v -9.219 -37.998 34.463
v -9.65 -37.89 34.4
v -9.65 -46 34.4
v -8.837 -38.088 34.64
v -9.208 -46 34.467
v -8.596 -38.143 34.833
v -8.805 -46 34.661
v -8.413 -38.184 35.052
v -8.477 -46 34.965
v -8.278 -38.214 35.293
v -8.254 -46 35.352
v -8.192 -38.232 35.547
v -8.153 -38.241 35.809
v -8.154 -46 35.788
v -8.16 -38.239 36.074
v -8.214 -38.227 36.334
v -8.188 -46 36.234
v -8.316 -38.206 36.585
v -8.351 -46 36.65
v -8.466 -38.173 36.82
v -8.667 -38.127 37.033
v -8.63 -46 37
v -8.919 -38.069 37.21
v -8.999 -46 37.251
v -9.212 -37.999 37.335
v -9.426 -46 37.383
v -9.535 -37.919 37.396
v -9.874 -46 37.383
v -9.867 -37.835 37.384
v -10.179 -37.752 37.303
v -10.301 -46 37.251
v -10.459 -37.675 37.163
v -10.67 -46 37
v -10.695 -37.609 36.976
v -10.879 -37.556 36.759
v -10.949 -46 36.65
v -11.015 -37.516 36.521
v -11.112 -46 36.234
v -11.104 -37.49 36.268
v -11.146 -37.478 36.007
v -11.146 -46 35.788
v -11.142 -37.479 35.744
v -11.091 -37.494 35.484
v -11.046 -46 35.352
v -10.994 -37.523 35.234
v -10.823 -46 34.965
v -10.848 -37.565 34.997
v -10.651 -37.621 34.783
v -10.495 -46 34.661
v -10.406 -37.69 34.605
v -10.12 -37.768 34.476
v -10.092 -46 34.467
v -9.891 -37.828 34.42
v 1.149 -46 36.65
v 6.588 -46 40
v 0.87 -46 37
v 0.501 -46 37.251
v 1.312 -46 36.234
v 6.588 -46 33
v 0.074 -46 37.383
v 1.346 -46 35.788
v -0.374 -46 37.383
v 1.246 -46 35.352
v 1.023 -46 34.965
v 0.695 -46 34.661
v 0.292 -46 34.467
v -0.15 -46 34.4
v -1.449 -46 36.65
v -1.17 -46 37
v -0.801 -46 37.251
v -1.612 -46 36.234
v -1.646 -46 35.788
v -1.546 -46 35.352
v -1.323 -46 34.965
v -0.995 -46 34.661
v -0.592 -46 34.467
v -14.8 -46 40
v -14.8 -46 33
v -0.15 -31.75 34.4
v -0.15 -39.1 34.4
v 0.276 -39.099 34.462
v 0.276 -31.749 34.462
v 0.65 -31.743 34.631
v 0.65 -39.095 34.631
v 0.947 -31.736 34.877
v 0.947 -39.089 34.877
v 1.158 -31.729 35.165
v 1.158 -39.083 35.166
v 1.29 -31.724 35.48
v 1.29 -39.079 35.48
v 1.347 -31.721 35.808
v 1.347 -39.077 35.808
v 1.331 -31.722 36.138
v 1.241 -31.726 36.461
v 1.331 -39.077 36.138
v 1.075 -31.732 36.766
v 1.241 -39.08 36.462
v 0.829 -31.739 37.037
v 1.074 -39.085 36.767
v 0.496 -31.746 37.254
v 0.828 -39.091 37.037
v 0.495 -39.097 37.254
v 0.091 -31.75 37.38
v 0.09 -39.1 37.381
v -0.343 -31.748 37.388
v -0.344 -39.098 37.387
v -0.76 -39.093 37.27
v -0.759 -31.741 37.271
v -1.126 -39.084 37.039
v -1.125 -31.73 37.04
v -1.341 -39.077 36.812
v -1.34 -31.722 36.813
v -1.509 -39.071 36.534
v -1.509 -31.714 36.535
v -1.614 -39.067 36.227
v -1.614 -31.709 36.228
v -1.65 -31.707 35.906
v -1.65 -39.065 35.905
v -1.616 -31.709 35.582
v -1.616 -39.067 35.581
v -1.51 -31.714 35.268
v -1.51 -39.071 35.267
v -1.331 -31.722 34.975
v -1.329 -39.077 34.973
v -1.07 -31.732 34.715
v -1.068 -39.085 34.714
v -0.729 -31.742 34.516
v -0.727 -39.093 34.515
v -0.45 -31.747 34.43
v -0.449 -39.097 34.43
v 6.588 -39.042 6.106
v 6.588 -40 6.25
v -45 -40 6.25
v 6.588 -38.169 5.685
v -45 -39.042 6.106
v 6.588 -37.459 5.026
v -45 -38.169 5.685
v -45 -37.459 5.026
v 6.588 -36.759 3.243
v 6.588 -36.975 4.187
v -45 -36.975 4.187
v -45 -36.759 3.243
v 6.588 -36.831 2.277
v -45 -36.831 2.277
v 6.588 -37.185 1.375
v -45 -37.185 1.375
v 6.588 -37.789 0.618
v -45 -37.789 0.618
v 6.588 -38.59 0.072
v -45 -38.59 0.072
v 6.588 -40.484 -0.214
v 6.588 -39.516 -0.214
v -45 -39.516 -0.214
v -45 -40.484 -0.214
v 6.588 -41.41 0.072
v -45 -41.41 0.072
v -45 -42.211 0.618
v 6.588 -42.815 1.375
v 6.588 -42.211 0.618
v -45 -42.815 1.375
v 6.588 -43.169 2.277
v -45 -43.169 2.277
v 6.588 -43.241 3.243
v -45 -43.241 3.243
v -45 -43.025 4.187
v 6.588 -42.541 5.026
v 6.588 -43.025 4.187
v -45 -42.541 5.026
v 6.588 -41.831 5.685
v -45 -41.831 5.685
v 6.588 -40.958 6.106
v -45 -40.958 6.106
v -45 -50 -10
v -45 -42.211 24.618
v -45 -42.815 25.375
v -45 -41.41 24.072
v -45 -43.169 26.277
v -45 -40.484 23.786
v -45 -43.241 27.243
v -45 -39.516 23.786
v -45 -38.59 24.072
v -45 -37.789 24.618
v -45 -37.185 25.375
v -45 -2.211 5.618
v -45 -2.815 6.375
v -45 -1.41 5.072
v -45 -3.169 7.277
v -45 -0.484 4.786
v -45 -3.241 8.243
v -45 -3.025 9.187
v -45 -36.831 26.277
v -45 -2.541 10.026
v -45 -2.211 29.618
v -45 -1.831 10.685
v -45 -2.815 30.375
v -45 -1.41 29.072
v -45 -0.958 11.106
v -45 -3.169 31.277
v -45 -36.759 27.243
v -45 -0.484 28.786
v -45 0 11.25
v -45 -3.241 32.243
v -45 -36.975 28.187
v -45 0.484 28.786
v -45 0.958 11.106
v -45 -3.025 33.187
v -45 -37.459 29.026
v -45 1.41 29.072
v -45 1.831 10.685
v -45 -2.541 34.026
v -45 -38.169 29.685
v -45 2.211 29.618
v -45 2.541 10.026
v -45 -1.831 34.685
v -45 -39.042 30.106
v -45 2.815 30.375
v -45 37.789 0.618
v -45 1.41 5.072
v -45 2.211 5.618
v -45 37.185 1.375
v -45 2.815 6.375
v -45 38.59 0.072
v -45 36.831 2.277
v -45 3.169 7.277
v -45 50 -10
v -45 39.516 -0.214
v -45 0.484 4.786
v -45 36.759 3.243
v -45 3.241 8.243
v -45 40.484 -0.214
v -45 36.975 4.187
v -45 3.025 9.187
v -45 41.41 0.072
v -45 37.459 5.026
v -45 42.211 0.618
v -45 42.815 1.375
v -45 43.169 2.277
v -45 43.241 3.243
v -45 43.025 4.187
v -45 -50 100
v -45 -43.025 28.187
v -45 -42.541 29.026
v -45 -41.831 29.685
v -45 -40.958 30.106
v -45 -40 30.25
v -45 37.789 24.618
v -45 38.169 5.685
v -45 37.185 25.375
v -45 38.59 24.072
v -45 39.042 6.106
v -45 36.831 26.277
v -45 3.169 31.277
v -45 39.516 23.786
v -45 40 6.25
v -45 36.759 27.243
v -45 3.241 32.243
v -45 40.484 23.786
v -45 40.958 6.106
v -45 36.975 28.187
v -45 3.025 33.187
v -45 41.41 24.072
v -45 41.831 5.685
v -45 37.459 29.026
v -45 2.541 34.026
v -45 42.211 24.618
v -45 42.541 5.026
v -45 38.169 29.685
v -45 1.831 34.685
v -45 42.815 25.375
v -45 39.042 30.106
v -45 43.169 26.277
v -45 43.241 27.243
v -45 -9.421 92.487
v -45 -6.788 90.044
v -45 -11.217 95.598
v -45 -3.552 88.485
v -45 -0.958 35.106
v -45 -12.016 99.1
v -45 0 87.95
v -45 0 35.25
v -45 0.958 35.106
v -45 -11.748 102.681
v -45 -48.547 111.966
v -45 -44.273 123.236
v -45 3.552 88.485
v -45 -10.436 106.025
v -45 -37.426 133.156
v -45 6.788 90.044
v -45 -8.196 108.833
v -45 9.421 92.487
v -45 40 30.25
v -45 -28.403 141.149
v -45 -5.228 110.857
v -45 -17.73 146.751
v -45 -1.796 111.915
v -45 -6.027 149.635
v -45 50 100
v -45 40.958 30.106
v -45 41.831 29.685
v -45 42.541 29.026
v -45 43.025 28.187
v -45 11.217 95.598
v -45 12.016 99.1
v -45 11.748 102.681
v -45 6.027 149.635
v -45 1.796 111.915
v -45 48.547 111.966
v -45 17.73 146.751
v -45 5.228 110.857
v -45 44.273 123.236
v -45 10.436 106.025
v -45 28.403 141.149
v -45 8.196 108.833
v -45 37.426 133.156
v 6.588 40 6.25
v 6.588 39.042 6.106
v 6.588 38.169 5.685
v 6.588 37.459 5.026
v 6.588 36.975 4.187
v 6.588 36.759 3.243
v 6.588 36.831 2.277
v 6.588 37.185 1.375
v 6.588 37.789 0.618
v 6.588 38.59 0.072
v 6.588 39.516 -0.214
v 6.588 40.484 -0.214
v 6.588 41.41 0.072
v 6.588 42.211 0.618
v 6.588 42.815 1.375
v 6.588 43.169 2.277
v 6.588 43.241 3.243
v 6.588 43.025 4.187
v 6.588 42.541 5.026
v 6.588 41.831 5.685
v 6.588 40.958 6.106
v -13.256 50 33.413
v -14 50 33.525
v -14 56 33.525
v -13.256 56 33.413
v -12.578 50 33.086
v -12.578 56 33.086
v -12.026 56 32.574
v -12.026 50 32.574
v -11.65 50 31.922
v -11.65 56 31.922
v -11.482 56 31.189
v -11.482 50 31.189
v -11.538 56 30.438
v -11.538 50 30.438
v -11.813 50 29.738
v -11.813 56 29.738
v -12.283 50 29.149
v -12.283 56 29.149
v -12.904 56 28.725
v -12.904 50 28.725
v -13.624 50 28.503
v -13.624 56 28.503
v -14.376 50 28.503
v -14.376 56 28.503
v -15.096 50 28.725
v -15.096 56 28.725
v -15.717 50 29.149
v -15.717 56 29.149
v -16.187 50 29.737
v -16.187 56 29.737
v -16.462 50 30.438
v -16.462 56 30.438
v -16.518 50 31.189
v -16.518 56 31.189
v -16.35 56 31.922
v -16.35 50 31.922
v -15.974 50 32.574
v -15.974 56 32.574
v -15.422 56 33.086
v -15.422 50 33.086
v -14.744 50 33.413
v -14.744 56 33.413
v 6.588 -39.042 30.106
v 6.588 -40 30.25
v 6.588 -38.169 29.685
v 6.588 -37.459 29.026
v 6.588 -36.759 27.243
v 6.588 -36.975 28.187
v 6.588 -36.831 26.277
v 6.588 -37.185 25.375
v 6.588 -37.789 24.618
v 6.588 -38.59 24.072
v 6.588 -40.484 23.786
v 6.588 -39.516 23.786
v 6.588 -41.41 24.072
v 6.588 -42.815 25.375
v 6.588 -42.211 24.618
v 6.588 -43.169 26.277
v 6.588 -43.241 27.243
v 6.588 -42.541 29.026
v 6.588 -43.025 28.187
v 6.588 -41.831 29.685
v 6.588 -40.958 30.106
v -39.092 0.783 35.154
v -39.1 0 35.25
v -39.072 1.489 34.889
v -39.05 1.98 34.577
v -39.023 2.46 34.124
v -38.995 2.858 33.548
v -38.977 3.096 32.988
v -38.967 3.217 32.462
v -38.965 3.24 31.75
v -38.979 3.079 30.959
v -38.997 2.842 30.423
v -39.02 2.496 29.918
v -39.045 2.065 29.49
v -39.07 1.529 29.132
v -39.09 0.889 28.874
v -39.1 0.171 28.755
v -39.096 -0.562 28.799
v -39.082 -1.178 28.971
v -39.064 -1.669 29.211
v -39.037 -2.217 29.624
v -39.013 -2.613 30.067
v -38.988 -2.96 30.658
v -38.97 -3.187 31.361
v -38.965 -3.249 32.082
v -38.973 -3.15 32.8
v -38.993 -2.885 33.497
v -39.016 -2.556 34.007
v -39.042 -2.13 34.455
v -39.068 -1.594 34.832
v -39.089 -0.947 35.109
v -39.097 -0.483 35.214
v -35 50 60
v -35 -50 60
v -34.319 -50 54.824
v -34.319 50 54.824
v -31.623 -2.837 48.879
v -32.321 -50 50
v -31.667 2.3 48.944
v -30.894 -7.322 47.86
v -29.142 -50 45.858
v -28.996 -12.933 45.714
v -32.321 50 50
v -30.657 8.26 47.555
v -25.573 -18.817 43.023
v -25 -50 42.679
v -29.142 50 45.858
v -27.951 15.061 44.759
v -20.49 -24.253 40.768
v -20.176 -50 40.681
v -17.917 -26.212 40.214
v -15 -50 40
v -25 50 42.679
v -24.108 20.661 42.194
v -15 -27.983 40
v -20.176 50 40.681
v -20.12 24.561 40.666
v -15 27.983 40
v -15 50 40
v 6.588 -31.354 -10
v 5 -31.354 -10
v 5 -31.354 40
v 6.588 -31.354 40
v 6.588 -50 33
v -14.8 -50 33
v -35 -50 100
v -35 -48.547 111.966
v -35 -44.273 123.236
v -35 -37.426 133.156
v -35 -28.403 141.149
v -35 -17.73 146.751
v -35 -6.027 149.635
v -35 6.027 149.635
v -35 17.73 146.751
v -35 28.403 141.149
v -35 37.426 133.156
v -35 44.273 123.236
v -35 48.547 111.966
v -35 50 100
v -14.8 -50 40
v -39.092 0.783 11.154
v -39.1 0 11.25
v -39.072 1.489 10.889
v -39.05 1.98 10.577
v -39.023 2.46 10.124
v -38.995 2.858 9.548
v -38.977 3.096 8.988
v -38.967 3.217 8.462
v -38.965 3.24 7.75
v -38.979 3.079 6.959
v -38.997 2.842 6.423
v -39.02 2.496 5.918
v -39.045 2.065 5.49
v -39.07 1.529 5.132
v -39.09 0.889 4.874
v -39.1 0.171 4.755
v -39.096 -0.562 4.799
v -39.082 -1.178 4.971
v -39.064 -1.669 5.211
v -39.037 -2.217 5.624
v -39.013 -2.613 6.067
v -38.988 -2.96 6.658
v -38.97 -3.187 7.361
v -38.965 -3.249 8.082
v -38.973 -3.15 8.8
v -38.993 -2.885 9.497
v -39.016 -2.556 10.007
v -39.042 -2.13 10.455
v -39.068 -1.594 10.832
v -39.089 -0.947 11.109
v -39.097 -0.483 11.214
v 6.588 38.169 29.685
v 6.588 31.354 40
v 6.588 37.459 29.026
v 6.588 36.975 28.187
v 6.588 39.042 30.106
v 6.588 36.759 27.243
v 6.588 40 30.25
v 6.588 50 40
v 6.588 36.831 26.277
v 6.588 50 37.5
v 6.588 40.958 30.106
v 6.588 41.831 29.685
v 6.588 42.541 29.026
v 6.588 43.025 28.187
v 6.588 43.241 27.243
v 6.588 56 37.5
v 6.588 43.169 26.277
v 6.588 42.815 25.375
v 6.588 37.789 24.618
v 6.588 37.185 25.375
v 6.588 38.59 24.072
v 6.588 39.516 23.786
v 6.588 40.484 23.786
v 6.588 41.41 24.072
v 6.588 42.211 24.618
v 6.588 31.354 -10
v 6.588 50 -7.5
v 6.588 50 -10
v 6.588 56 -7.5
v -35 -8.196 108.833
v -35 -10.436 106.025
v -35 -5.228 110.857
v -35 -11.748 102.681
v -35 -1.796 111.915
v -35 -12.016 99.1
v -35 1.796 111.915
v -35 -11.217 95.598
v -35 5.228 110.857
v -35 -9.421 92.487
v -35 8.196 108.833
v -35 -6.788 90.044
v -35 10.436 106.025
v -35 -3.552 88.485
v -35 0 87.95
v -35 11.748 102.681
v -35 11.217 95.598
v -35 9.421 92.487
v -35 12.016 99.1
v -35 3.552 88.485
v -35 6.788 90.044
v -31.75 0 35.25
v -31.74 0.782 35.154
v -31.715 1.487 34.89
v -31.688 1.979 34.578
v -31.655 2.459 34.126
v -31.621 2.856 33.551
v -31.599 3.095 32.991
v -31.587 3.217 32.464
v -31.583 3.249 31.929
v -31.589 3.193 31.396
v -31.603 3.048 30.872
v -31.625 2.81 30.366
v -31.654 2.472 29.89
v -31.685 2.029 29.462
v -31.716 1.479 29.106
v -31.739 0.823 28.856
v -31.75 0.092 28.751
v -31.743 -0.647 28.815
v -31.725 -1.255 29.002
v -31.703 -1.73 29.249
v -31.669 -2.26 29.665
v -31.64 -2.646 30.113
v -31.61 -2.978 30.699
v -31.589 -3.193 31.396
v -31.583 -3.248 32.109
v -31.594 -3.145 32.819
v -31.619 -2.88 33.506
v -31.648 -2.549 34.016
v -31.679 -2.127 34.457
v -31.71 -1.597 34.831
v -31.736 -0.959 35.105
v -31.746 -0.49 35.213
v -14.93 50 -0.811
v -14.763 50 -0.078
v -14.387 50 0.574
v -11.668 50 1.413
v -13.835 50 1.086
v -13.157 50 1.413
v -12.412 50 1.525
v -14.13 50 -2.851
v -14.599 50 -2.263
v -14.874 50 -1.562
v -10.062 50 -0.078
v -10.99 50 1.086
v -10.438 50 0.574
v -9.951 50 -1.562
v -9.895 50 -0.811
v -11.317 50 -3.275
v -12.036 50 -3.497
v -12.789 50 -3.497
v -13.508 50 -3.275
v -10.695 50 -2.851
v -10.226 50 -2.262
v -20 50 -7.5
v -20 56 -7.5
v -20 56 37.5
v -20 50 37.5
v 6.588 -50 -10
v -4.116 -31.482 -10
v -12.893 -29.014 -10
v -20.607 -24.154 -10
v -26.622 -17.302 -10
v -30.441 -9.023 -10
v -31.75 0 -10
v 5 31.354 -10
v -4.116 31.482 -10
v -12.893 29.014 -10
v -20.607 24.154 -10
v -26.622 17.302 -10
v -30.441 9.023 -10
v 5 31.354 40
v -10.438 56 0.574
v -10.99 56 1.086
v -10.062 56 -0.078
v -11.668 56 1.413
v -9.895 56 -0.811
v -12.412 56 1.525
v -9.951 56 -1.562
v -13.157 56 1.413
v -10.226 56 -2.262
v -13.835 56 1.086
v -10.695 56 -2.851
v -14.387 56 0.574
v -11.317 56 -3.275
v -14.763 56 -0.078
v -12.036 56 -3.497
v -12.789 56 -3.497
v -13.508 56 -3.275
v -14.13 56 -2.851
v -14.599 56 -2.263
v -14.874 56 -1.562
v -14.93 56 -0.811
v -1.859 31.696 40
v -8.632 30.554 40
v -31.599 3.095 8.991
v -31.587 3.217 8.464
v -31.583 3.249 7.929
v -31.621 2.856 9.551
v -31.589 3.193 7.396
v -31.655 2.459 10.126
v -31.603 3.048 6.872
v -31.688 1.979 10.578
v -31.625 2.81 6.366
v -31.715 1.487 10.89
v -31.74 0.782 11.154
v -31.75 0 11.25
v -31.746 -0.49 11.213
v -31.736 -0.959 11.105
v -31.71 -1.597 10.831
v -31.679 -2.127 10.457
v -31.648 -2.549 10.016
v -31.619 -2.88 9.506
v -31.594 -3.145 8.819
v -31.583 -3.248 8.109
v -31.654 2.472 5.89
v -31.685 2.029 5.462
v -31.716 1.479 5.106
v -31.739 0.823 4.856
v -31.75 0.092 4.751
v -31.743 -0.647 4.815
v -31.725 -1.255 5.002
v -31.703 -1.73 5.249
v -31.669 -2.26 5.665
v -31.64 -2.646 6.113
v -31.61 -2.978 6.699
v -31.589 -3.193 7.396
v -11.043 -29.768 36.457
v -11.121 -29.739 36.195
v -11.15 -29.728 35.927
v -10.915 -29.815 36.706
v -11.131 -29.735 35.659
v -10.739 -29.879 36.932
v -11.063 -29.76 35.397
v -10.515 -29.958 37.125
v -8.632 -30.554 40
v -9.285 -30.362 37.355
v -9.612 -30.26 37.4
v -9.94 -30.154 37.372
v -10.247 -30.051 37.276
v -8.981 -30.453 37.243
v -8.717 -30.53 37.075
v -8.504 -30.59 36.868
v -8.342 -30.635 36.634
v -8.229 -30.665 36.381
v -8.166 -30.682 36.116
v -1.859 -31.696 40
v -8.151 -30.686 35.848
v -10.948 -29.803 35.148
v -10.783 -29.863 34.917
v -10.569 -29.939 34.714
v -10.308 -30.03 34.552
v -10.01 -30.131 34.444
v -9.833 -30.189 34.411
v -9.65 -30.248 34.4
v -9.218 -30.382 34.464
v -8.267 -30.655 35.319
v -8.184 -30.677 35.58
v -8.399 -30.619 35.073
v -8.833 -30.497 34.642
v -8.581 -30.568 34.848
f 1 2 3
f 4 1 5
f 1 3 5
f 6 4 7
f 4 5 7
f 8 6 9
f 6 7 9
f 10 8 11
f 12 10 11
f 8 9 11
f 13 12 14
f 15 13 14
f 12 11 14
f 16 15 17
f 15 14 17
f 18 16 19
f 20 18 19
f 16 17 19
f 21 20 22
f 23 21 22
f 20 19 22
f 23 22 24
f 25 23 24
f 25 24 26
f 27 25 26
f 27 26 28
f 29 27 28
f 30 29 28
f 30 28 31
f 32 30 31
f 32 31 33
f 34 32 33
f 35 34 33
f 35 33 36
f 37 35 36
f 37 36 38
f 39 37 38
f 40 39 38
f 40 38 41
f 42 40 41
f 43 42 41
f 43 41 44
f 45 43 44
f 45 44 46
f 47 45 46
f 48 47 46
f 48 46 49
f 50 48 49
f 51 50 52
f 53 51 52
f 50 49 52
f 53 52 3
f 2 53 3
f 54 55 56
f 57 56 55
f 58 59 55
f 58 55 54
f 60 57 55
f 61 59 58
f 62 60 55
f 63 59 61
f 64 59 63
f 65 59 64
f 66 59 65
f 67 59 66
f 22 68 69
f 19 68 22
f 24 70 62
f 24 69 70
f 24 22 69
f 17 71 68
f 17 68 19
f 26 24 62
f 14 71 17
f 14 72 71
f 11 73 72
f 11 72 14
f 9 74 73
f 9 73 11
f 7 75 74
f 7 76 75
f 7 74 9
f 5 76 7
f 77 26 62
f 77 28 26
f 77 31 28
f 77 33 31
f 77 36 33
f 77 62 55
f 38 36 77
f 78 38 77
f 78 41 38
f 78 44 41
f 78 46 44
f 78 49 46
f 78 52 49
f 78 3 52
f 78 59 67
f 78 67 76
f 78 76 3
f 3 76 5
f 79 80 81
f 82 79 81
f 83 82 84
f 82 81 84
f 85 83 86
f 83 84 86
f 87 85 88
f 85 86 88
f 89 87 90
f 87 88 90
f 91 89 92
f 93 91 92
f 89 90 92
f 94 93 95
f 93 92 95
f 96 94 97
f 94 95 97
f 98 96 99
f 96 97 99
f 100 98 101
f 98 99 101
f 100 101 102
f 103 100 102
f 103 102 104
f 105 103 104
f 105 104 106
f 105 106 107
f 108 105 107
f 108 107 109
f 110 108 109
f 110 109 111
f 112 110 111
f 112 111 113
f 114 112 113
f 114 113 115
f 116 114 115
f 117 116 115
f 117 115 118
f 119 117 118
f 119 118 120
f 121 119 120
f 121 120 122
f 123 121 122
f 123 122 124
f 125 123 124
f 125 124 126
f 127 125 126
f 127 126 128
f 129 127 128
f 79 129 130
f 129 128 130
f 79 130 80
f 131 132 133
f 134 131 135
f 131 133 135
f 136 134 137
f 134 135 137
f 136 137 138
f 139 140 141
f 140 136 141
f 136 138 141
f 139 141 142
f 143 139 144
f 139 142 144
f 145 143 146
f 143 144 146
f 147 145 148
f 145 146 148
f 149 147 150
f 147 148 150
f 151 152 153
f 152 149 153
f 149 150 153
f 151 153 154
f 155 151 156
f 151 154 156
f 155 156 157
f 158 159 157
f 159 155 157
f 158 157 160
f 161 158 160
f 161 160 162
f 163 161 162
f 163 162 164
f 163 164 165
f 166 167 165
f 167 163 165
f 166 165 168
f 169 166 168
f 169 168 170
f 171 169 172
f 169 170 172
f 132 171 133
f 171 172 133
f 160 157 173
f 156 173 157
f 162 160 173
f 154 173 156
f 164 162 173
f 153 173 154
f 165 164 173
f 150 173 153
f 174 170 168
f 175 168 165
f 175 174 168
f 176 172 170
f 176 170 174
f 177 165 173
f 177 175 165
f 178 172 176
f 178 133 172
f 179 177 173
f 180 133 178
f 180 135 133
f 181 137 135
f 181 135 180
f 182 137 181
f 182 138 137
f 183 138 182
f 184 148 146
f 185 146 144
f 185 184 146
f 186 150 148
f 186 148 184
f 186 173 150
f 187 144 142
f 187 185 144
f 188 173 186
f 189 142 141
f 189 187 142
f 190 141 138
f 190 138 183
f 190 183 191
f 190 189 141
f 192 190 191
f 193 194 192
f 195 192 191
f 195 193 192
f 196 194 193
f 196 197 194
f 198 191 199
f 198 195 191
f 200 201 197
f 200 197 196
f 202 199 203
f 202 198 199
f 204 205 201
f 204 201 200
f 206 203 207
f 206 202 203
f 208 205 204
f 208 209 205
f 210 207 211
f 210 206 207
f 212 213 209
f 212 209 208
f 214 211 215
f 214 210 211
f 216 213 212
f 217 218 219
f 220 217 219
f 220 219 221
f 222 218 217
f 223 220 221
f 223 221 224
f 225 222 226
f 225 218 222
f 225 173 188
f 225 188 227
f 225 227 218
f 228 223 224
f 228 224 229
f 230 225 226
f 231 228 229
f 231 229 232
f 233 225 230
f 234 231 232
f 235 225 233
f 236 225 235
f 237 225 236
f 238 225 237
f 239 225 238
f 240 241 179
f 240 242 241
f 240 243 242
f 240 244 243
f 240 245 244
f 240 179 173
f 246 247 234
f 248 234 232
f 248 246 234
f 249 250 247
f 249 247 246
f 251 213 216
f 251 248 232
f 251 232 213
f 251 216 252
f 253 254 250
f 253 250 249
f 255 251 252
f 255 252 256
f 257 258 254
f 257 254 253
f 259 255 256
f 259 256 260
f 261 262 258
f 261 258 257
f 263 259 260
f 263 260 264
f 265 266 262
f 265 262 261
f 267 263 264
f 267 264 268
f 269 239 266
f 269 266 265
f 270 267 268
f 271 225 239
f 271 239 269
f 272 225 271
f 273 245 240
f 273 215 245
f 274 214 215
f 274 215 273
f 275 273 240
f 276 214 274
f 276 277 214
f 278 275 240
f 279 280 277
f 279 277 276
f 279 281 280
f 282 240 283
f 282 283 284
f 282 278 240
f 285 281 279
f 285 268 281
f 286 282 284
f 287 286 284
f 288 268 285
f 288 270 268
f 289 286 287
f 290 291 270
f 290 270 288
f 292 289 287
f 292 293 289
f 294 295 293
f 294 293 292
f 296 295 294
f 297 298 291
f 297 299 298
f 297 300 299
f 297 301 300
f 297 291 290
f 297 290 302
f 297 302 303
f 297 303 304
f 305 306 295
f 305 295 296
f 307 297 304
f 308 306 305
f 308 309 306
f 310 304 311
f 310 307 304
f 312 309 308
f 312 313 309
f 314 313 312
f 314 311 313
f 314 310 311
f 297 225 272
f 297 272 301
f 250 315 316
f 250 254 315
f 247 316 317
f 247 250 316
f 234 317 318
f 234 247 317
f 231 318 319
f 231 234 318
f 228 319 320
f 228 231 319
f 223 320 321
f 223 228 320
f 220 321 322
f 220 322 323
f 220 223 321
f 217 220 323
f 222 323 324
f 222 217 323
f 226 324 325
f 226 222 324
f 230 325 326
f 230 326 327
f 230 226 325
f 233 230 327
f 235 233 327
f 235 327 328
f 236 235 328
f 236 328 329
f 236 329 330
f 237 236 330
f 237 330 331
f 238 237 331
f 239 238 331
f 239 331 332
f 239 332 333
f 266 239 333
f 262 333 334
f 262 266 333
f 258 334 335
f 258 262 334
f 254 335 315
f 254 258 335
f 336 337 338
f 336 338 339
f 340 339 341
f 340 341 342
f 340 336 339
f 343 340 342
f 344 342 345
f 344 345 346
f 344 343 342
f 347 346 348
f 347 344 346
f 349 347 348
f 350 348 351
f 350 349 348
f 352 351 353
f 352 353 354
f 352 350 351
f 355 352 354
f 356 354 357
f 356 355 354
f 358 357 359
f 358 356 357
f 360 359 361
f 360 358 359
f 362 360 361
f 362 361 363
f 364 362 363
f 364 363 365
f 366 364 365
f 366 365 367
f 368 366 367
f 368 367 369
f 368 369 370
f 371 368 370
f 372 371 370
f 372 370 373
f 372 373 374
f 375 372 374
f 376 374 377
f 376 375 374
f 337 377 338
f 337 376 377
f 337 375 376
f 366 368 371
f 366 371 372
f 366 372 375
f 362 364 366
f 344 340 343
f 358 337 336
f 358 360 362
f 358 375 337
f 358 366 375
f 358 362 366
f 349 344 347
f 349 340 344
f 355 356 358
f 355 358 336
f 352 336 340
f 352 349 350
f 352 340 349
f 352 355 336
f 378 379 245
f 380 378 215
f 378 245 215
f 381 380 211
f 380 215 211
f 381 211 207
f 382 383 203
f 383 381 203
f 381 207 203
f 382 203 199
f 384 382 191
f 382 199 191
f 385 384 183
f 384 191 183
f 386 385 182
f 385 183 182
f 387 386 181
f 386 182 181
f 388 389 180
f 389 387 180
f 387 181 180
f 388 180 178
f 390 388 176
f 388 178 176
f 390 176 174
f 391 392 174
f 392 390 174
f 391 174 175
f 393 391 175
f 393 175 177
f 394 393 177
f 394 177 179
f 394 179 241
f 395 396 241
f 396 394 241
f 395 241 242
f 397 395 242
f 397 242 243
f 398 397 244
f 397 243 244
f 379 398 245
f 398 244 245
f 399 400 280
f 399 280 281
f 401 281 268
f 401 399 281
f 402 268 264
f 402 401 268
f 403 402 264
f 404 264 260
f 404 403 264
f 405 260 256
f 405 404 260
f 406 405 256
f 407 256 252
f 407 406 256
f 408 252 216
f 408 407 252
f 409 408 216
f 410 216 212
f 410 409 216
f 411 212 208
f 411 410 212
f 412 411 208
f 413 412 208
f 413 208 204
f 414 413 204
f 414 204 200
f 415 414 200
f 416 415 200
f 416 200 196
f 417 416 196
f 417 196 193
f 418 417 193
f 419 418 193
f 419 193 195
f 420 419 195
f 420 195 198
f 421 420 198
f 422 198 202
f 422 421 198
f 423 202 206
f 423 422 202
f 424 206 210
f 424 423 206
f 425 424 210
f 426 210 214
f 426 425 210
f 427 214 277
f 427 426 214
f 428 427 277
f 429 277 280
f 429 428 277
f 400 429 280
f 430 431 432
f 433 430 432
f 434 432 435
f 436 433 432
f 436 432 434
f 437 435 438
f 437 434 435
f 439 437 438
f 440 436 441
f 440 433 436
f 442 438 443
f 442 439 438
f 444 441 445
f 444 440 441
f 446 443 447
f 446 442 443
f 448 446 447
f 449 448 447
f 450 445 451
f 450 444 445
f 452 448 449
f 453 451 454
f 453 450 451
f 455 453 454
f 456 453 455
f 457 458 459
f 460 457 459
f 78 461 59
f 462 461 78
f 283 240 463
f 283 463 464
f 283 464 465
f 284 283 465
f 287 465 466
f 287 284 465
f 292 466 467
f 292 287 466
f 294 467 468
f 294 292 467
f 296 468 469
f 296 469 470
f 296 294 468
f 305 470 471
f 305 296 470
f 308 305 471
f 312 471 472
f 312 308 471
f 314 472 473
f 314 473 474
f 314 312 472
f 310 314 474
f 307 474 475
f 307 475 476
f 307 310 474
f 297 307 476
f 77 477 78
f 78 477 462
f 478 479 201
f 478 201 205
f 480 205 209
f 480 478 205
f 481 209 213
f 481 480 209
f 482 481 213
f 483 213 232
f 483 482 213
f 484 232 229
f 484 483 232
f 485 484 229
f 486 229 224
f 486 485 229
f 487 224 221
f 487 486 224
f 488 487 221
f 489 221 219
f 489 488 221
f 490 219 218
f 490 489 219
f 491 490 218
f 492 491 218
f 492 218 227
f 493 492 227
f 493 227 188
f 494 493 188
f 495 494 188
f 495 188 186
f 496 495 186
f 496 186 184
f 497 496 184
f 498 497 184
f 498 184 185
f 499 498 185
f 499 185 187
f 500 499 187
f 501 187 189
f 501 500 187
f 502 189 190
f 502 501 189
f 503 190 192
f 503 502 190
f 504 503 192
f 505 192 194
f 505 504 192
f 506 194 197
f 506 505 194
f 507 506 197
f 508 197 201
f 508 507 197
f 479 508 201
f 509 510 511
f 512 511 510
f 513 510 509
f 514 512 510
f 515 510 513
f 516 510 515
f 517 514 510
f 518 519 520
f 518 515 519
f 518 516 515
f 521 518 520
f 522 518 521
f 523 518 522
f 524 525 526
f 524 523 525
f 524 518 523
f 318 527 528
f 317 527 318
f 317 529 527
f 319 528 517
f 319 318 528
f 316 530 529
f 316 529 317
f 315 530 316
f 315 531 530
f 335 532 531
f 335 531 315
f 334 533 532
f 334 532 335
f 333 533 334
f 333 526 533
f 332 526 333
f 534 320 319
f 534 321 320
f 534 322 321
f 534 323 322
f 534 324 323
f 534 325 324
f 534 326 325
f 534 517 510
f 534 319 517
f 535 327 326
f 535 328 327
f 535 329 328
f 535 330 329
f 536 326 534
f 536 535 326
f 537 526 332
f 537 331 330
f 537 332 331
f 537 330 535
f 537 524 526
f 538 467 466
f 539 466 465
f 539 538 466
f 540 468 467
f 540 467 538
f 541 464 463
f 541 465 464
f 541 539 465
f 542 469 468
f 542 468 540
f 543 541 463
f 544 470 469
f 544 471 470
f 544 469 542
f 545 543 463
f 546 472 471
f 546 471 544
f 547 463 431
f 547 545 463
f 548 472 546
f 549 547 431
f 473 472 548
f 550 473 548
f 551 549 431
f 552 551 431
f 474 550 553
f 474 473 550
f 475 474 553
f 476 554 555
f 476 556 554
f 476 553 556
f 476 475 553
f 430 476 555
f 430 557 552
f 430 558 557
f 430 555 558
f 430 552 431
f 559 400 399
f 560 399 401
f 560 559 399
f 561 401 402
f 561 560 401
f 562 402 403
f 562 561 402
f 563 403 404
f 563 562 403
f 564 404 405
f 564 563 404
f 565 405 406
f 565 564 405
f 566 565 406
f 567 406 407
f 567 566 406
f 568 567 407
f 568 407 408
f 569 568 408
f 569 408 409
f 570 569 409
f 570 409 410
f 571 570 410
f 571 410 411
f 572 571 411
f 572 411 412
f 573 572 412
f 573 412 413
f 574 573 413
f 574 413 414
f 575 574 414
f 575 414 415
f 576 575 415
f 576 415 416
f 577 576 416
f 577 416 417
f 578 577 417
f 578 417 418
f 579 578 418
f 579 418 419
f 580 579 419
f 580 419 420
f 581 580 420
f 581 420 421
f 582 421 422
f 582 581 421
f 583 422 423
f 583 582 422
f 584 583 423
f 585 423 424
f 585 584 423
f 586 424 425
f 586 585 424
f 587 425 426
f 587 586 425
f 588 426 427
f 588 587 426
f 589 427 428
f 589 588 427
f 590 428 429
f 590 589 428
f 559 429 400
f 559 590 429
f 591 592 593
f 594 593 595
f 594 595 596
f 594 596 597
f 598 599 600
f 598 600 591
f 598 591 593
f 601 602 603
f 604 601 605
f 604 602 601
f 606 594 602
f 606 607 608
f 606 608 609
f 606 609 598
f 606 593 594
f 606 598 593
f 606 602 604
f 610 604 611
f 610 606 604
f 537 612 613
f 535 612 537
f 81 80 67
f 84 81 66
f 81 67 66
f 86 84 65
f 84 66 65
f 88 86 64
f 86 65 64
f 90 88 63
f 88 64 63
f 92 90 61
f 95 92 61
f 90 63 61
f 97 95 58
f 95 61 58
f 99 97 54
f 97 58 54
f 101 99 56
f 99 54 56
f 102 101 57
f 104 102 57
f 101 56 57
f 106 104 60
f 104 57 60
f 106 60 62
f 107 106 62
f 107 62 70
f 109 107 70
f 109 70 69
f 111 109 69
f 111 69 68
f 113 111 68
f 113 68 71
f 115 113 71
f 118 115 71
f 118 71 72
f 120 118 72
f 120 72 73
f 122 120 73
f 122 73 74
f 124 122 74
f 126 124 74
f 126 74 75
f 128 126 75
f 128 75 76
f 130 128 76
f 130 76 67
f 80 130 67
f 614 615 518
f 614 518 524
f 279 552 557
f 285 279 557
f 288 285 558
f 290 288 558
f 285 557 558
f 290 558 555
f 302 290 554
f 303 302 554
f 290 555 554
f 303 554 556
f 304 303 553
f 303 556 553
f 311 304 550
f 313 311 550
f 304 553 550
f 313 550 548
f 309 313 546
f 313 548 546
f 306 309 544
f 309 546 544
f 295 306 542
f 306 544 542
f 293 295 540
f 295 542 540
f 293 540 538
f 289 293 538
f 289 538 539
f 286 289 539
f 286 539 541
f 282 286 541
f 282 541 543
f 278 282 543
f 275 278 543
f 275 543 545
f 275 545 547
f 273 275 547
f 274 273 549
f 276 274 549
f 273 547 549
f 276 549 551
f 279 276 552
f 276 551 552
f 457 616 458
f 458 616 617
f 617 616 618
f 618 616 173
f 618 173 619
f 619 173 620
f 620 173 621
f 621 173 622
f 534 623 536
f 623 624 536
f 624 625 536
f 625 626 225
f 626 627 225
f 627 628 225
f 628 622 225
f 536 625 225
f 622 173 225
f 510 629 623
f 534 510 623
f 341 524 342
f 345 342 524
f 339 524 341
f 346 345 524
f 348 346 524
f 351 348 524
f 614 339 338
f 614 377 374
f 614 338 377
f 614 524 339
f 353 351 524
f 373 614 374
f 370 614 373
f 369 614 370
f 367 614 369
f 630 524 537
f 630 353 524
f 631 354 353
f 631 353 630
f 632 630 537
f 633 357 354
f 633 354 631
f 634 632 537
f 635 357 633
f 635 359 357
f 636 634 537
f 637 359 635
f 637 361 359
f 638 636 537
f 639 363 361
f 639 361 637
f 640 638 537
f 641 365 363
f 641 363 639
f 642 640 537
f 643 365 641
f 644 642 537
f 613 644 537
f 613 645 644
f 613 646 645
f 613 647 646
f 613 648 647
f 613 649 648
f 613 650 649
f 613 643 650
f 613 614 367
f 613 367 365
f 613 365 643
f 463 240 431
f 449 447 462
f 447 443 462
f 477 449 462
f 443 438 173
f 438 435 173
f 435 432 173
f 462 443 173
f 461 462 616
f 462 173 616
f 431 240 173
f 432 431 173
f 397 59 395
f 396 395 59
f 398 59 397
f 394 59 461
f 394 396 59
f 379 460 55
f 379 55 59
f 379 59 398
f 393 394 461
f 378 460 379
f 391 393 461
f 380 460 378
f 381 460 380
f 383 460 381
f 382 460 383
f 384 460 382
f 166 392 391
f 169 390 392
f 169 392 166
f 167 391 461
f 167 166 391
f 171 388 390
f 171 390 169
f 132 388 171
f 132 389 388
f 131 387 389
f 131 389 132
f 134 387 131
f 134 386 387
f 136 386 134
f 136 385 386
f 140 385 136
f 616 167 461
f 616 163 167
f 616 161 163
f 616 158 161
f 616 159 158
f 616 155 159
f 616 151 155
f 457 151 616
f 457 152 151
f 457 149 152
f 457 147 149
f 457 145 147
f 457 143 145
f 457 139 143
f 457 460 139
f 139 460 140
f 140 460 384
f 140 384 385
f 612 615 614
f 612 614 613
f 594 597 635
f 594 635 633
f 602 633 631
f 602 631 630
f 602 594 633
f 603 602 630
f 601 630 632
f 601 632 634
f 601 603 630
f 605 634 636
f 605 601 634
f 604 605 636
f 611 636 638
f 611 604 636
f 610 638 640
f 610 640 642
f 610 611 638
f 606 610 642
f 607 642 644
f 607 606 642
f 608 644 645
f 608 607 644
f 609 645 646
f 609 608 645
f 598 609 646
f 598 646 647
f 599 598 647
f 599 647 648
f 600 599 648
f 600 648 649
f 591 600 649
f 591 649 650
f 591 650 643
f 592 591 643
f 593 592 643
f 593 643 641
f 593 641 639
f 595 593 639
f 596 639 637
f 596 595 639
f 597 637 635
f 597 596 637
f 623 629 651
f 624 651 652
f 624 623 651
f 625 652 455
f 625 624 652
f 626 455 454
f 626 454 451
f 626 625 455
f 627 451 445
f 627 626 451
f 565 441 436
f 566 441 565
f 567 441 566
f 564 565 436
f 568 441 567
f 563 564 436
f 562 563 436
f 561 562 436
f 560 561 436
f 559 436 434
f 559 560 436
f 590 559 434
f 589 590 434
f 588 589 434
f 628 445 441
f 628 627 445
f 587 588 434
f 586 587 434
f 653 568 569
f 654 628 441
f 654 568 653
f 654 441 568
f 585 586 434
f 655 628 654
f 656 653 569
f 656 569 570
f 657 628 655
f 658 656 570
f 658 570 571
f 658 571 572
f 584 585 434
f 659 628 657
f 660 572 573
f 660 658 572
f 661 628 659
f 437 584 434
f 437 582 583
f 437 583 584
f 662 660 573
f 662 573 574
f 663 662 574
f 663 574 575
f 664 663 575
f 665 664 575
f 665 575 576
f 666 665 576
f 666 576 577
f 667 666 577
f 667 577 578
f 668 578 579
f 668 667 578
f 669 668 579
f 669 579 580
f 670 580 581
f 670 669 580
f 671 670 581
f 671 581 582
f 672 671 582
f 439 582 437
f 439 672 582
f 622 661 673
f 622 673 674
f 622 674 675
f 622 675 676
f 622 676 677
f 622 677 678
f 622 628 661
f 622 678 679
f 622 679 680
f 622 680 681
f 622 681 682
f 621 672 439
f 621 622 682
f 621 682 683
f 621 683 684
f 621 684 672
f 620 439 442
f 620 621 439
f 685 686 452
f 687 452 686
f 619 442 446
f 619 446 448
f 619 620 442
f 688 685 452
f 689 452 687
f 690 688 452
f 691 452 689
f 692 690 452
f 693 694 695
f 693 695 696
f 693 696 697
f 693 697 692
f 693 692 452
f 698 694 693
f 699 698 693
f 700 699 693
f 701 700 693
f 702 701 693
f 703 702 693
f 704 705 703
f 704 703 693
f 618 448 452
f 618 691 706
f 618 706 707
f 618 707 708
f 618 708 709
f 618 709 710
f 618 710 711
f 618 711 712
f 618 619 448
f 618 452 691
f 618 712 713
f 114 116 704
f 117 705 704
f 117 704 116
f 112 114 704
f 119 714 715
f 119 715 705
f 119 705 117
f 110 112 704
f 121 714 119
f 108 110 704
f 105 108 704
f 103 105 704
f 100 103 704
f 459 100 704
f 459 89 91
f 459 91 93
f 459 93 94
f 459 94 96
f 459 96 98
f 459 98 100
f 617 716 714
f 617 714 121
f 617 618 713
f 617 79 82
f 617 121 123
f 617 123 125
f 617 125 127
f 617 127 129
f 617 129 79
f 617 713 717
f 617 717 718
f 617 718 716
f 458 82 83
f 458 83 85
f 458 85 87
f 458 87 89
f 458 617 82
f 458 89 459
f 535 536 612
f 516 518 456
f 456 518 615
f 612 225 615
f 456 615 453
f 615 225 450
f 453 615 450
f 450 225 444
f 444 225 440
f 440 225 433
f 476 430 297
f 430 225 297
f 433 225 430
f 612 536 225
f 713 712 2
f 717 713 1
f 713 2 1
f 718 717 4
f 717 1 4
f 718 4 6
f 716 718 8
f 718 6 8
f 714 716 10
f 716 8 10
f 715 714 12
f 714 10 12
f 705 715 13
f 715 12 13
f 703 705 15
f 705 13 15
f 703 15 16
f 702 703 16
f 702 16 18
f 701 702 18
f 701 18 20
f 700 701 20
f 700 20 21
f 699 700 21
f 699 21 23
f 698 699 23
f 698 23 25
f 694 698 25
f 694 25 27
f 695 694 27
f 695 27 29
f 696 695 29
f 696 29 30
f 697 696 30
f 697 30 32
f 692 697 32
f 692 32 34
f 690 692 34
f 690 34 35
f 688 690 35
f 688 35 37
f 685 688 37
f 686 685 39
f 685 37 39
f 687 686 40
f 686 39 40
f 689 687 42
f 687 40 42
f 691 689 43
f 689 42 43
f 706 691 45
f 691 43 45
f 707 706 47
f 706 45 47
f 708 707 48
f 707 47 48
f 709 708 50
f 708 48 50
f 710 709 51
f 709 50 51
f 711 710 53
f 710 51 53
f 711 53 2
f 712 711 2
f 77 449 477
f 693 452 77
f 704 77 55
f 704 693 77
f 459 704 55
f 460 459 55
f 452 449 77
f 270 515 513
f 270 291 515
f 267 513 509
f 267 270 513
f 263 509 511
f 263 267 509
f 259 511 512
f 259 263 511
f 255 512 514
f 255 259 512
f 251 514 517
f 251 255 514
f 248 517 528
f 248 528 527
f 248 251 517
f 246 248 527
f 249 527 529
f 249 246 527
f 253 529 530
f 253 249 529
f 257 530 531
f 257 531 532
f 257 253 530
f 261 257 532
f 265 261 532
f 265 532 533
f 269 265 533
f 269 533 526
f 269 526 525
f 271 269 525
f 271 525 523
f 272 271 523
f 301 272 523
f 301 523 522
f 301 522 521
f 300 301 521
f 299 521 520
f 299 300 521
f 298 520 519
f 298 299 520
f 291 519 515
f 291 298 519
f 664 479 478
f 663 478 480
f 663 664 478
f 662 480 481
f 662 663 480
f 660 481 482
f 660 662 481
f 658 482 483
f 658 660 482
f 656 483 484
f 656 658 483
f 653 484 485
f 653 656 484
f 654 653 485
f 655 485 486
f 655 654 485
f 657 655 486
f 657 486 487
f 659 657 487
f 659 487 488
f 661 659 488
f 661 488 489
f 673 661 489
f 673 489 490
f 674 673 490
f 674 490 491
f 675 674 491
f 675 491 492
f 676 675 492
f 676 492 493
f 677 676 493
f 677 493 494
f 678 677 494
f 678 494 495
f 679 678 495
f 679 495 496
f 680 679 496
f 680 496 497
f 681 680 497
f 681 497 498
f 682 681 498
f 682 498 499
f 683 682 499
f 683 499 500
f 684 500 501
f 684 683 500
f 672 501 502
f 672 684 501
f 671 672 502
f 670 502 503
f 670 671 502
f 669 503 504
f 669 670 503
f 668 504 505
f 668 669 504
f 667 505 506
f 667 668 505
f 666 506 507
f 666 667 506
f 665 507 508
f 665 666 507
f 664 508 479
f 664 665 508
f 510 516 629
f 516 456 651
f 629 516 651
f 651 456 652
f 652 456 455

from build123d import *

# Parameters (mm, degrees)
CENTRE_HOLE_FOR_L2_DEPTH      = 40
CENTRE_HOLE_FOR_L2_DEPTH_BACK = 10
SKETCH1_R                     = 39.1
SKETCH1_R_2                   = 31.75
MAIN_STRUCTURE_DEPTH          = 60
MAIN_STRUCTURE_DEPTH_BACK     = 50
SKETCH2_W                     = 90
SKETCH2_H                     = 100
SKETCH2_R                     = 31.75
BEARING_CURVE_DEPTH           = 10
SKETCH6_R                     = 10.5
SHAFT_HOLE_DEPTH              = 10
WRIST_CUTOUT_DEPTH            = 186.809041761
SURFACECUT1_START             = 5
SURFACECUT1_OUTLINE_R         = 10.5
SURFACECUT1_DEPTH             = 40
SKETCH11_W                    = 25
SKETCH11_H                    = 45
SKETCH11_R                    = 2.525
BOSS_EXTRUDE1_DEPTH           = 6
SKETCH15_W                    = 19.8
SKETCH15_H                    = 7
CUT_EXTRUDE4_DEPTH            = 4
CUT_EXTRUDE5_REACH            = 188.893
CUT_EXTRUDE5_END_RADIUS       = 31.75
SKETCH16_R                    = 1.5
CUT_EXTRUDE6_DEPTH            = 168.7378908
CUT_EXTRUDE6_DEPTH_BACK       = 168.7378908
SKETCH18_R                    = 3.25
SKETCH19_R                    = 3.25
CUT_EXTRUDE7_DEPTH            = 168.7378908
SKETCH9_R                     = 12.05
CUT_EXTRUDE8_DEPTH            = 10
SKETCH20_R                    = 3.25
SKETCH20_W                    = 45
SKETCH20_H                    = 6
BOSS_EXTRUDE2_DEPTH           = 1.5875


# Read off the part's stored shape, not the designer's step: SurfaceCut1
with BuildPart() as part:
    # Sketch1 → Centre Hole for L2 (new, two sides: drawn at the far end of the back side and taken through both)
    with BuildSketch(Plane.XY.offset(-CENTRE_HOLE_FOR_L2_DEPTH_BACK)):
        Circle(SKETCH1_R)
        Circle(SKETCH1_R_2, mode=Mode.SUBTRACT)
    extrude(amount=CENTRE_HOLE_FOR_L2_DEPTH + CENTRE_HOLE_FOR_L2_DEPTH_BACK)


with BuildPart() as body_2:
    # Sketch2 → Main Structure (new, two sides: drawn at the far end of the back side and taken through both)
    with BuildSketch(Plane.XY.offset(40).offset(-MAIN_STRUCTURE_DEPTH_BACK)):
        Rectangle(SKETCH2_W, SKETCH2_H)
        Circle(SKETCH2_R, mode=Mode.SUBTRACT)
    extrude(amount=MAIN_STRUCTURE_DEPTH + MAIN_STRUCTURE_DEPTH_BACK)

    # Sketch3 → Bearing Curve (add)
    with BuildSketch(Plane.ZY.offset(45)):
        with BuildLine():
            Line((100, 50), (100, -50))
            ThreePointArc((100, -50), (150, 0), (100, 50))
        make_face()
    bearing_curve = extrude(amount=-BEARING_CURVE_DEPTH)

    # Upright Mirror: Bearing Curve across plane
    add(bearing_curve.mirror(Plane(origin=(0, 0, 0), x_dir=(0, 0, 1), z_dir=(1, 0, 0))))

    # Sketch6 → Shaft Hole (cut)
    with BuildSketch(Plane.ZY.offset(45)):
        with Locations((100, 0)):
            Circle(SKETCH6_R)
    shaft_hole = extrude(amount=-SHAFT_HOLE_DEPTH, mode=Mode.SUBTRACT)

    # Sketch4 → Wrist Cutout (cut, through all)
    with BuildSketch(Plane(origin=(0, 50, 0), x_dir=(1, 0, 0), z_dir=(0, 1, 0))):
        with BuildLine():
            Line((-35, -100), (-35, -60))
            ThreePointArc((-35, -60), (-29.142135624, -45.857864376), (-15, -40))
            Line((-15, -40), (15, -40))
            ThreePointArc((15, -40), (29.142135624, -45.857864376), (35, -60))
            Line((35, -60), (35, -100))
            Line((35, -100), (-35, -100))
        make_face()
    extrude(amount=-WRIST_CUTOUT_DEPTH, mode=Mode.SUBTRACT)

    # Bearing Mirror: Shaft Hole across plane
    add(shaft_hole.mirror(Plane(origin=(0, 0, 0), x_dir=(0, 0, 1), z_dir=(1, 0, 0))), mode=Mode.SUBTRACT)


with BuildPart() as surfacecut1_tool:
    # SurfaceCut1 outline → SurfaceCut1 (new body)
    with BuildSketch(Plane.YZ.offset(SURFACECUT1_START)):
        with BuildLine():
            ThreePointArc((50, 100), (0, 150), (-50, 100))
            Line((-50, 100), (-50, -10))
            Line((-50, -10), (50, -10))
            Line((50, -10), (50, 100))
        make_face()
        with Locations((0, 100)):
            Circle(SURFACECUT1_OUTLINE_R, mode=Mode.SUBTRACT)
    extrude(amount=SURFACECUT1_DEPTH)


with BuildPart() as part_1:
    add(part.part)

    # SurfaceCut1: cut by surfacecut1_tool
    add(surfacecut1_tool.part, mode=Mode.SUBTRACT)


with BuildPart() as body_2_1:
    add(body_2.part)

    # SurfaceCut1: cut by surfacecut1_tool
    add(surfacecut1_tool.part, mode=Mode.SUBTRACT)

    # Sketch15 → Cut-Extrude4 (cut)
    with BuildSketch(Plane(origin=(0, -50, 0), x_dir=(-1, 0, 0), z_dir=(0, -1, 0))):
        with Locations((4.9, -36.5)):
            Rectangle(SKETCH15_W, SKETCH15_H)
    extrude(amount=-CUT_EXTRUDE4_DEPTH, mode=Mode.SUBTRACT)


with BuildPart() as body_3:
    # Sketch11 → Boss-Extrude1 (new body)
    with BuildSketch(Plane(origin=(0, 50, 0), x_dir=(1, 0, 0), z_dir=(0, 1, 0))):
        with Locations((-7.5, -15)):
            Rectangle(SKETCH11_W, SKETCH11_H)
        with Locations(Location((-12.4125, 1, 0), (0, 0, 270))):
            Circle(SKETCH11_R, mode=Mode.SUBTRACT)
        with Locations(Location((-14, -31, 0), (0, 0, 270))):
            Circle(SKETCH11_R, mode=Mode.SUBTRACT)
    extrude(amount=BOSS_EXTRUDE1_DEPTH)


with BuildPart() as cut_extrude5_tool:
    # Cut-Extrude5: up to this cylinder (the profile starts outside it)
    cut_extrude5_end = Plane(origin=(0, 0, 35.9), z_dir=(0, 0, 1)) * Cylinder(CUT_EXTRUDE5_END_RADIUS, 442.286, mode=Mode.PRIVATE)
    # Sketch16 → Cut-Extrude5 (new, up to the surface)
    with BuildSketch(Plane(origin=(0, -46, 0), x_dir=(-1, 0, 0), z_dir=(0, -1, 0)), mode=Mode.PRIVATE) as cut_extrude5_sk1:
        with Locations(Location((9.65, -35.9, 0), (0, 0, 90))):
            Circle(SKETCH16_R)
    cut_extrude5_tool1 = extrude(cut_extrude5_sk1.sketch, amount=-CUT_EXTRUDE5_REACH, mode=Mode.PRIVATE) - cut_extrude5_end
    add(cut_extrude5_tool1.solids().sort_by_distance((-9.65, -46, 35.9))[0])
    # Sketch16 → Cut-Extrude5 (new, up to the surface)
    with BuildSketch(Plane(origin=(0, -46, 0), x_dir=(-1, 0, 0), z_dir=(0, -1, 0)), mode=Mode.PRIVATE) as cut_extrude5_sk2:
        with Locations(Location((0.15, -35.9, 0), (0, 0, 90))):
            Circle(SKETCH16_R)
    cut_extrude5_tool2 = extrude(cut_extrude5_sk2.sketch, amount=-CUT_EXTRUDE5_REACH, mode=Mode.PRIVATE) - cut_extrude5_end
    add(cut_extrude5_tool2.solids().sort_by_distance((-0.15, -46, 35.9))[0])


with BuildPart() as part_2:
    add(part_1.part)

    # Cut-Extrude5: cut by cut_extrude5_tool
    add(cut_extrude5_tool.part, mode=Mode.SUBTRACT)


with BuildPart() as body_2_2:
    add(body_2_1.part)

    # Cut-Extrude5: cut by cut_extrude5_tool
    add(cut_extrude5_tool.part, mode=Mode.SUBTRACT)


with BuildPart() as cut_extrude6_tool:
    # Sketch18 → Cut-Extrude6 (new, two sides: drawn at the far end of the back side and taken through both)
    with BuildSketch(Plane.ZY.offset(45).offset(-CUT_EXTRUDE6_DEPTH_BACK)):
        with Locations((8, 0)):
            Circle(SKETCH18_R)
        with Locations((32, 0)):
            Circle(SKETCH18_R)
    extrude(amount=CUT_EXTRUDE6_DEPTH + CUT_EXTRUDE6_DEPTH_BACK)


with BuildPart() as part_3:
    add(part_2.part)

    # Cut-Extrude6: cut by cut_extrude6_tool
    add(cut_extrude6_tool.part, mode=Mode.SUBTRACT)


with BuildPart() as body_2_3:
    add(body_2_2.part)

    # Cut-Extrude6: cut by cut_extrude6_tool
    add(cut_extrude6_tool.part, mode=Mode.SUBTRACT)


with BuildPart() as cut_extrude7_tool:
    # Sketch19 → Cut-Extrude7 (new, through all)
    with BuildSketch(Plane.ZY.offset(45)):
        with Locations((32, 0)):
            Circle(SKETCH19_R)
        with Locations((8, 0)):
            Circle(SKETCH19_R)
        with Locations((3, 40)):
            Circle(SKETCH19_R)
        with Locations((27, 40)):
            Circle(SKETCH19_R)
        with Locations((3, -40)):
            Circle(SKETCH19_R)
        with Locations((27, -40)):
            Circle(SKETCH19_R)
    extrude(amount=-CUT_EXTRUDE7_DEPTH)


with BuildPart() as part_4:
    add(part_3.part)

    # Cut-Extrude7: cut by cut_extrude7_tool
    add(cut_extrude7_tool.part, mode=Mode.SUBTRACT)



with BuildPart() as body_2_4:
    add(body_2_3.part)

    # Cut-Extrude7: cut by cut_extrude7_tool
    add(cut_extrude7_tool.part, mode=Mode.SUBTRACT)

    # Sketch9 → Cut-Extrude8 (cut)
    with BuildSketch(Plane(origin=(-35, 0, 0), x_dir=(0, 0, -1), z_dir=(1, 0, 0))):
        with Locations((-100, 0)):
            Circle(SKETCH9_R)
    extrude(amount=-CUT_EXTRUDE8_DEPTH, mode=Mode.SUBTRACT)


with BuildPart() as part_5:
    add(part_4.part)

    add(body_2_4.part)  # Boss-Extrude2 merges body 2

    add(body_3.part)  # Boss-Extrude2 merges body 3
    # Sketch20 → Boss-Extrude2 (add)
    # profile 1 of 3: a face of its own
    with BuildSketch(Plane(origin=(5, 0, 0), x_dir=(0, 0, -1), z_dir=(1, 0, 0))):
        Polygon((-40, 50), (-40, 38.778989157), (-40, 31.353827518), (10, 31.353827518), (10, 38.778989157), (10, 50), (7.5, 50), (-37.5, 50), align=None)
        with Locations(Location((-27, 40, 0), (0, 0, 180))):
            Circle(SKETCH20_R, mode=Mode.SUBTRACT)
        with Locations(Location((-3, 40, 0), (0, 0, 180))):
            Circle(SKETCH20_R, mode=Mode.SUBTRACT)
    # profile 2 of 3: a face of its own
    with BuildSketch(Plane(origin=(5, 0, 0), x_dir=(0, 0, -1), z_dir=(1, 0, 0))):
        with Locations((-15, 53)):
            Rectangle(SKETCH20_W, SKETCH20_H)
    # profile 3 of 3: a face of its own
    with BuildSketch(Plane(origin=(5, 0, 0), x_dir=(0, 0, -1), z_dir=(1, 0, 0))):
        Polygon((10, -50), (10, -38.778989157), (10, -31.353827518), (-40, -31.353827518), (-40, -38.778989157), (-40, -46), (-33, -46), (-33, -50), align=None)
        with Locations(Location((-27, -40, 0), (0, 0, 180))):
            Circle(SKETCH20_R, mode=Mode.SUBTRACT)
        with Locations(Location((-3, -40, 0), (0, 0, 180))):
            Circle(SKETCH20_R, mode=Mode.SUBTRACT)
    extrude(amount=BOSS_EXTRUDE2_DEPTH)


solid = part_5.part
